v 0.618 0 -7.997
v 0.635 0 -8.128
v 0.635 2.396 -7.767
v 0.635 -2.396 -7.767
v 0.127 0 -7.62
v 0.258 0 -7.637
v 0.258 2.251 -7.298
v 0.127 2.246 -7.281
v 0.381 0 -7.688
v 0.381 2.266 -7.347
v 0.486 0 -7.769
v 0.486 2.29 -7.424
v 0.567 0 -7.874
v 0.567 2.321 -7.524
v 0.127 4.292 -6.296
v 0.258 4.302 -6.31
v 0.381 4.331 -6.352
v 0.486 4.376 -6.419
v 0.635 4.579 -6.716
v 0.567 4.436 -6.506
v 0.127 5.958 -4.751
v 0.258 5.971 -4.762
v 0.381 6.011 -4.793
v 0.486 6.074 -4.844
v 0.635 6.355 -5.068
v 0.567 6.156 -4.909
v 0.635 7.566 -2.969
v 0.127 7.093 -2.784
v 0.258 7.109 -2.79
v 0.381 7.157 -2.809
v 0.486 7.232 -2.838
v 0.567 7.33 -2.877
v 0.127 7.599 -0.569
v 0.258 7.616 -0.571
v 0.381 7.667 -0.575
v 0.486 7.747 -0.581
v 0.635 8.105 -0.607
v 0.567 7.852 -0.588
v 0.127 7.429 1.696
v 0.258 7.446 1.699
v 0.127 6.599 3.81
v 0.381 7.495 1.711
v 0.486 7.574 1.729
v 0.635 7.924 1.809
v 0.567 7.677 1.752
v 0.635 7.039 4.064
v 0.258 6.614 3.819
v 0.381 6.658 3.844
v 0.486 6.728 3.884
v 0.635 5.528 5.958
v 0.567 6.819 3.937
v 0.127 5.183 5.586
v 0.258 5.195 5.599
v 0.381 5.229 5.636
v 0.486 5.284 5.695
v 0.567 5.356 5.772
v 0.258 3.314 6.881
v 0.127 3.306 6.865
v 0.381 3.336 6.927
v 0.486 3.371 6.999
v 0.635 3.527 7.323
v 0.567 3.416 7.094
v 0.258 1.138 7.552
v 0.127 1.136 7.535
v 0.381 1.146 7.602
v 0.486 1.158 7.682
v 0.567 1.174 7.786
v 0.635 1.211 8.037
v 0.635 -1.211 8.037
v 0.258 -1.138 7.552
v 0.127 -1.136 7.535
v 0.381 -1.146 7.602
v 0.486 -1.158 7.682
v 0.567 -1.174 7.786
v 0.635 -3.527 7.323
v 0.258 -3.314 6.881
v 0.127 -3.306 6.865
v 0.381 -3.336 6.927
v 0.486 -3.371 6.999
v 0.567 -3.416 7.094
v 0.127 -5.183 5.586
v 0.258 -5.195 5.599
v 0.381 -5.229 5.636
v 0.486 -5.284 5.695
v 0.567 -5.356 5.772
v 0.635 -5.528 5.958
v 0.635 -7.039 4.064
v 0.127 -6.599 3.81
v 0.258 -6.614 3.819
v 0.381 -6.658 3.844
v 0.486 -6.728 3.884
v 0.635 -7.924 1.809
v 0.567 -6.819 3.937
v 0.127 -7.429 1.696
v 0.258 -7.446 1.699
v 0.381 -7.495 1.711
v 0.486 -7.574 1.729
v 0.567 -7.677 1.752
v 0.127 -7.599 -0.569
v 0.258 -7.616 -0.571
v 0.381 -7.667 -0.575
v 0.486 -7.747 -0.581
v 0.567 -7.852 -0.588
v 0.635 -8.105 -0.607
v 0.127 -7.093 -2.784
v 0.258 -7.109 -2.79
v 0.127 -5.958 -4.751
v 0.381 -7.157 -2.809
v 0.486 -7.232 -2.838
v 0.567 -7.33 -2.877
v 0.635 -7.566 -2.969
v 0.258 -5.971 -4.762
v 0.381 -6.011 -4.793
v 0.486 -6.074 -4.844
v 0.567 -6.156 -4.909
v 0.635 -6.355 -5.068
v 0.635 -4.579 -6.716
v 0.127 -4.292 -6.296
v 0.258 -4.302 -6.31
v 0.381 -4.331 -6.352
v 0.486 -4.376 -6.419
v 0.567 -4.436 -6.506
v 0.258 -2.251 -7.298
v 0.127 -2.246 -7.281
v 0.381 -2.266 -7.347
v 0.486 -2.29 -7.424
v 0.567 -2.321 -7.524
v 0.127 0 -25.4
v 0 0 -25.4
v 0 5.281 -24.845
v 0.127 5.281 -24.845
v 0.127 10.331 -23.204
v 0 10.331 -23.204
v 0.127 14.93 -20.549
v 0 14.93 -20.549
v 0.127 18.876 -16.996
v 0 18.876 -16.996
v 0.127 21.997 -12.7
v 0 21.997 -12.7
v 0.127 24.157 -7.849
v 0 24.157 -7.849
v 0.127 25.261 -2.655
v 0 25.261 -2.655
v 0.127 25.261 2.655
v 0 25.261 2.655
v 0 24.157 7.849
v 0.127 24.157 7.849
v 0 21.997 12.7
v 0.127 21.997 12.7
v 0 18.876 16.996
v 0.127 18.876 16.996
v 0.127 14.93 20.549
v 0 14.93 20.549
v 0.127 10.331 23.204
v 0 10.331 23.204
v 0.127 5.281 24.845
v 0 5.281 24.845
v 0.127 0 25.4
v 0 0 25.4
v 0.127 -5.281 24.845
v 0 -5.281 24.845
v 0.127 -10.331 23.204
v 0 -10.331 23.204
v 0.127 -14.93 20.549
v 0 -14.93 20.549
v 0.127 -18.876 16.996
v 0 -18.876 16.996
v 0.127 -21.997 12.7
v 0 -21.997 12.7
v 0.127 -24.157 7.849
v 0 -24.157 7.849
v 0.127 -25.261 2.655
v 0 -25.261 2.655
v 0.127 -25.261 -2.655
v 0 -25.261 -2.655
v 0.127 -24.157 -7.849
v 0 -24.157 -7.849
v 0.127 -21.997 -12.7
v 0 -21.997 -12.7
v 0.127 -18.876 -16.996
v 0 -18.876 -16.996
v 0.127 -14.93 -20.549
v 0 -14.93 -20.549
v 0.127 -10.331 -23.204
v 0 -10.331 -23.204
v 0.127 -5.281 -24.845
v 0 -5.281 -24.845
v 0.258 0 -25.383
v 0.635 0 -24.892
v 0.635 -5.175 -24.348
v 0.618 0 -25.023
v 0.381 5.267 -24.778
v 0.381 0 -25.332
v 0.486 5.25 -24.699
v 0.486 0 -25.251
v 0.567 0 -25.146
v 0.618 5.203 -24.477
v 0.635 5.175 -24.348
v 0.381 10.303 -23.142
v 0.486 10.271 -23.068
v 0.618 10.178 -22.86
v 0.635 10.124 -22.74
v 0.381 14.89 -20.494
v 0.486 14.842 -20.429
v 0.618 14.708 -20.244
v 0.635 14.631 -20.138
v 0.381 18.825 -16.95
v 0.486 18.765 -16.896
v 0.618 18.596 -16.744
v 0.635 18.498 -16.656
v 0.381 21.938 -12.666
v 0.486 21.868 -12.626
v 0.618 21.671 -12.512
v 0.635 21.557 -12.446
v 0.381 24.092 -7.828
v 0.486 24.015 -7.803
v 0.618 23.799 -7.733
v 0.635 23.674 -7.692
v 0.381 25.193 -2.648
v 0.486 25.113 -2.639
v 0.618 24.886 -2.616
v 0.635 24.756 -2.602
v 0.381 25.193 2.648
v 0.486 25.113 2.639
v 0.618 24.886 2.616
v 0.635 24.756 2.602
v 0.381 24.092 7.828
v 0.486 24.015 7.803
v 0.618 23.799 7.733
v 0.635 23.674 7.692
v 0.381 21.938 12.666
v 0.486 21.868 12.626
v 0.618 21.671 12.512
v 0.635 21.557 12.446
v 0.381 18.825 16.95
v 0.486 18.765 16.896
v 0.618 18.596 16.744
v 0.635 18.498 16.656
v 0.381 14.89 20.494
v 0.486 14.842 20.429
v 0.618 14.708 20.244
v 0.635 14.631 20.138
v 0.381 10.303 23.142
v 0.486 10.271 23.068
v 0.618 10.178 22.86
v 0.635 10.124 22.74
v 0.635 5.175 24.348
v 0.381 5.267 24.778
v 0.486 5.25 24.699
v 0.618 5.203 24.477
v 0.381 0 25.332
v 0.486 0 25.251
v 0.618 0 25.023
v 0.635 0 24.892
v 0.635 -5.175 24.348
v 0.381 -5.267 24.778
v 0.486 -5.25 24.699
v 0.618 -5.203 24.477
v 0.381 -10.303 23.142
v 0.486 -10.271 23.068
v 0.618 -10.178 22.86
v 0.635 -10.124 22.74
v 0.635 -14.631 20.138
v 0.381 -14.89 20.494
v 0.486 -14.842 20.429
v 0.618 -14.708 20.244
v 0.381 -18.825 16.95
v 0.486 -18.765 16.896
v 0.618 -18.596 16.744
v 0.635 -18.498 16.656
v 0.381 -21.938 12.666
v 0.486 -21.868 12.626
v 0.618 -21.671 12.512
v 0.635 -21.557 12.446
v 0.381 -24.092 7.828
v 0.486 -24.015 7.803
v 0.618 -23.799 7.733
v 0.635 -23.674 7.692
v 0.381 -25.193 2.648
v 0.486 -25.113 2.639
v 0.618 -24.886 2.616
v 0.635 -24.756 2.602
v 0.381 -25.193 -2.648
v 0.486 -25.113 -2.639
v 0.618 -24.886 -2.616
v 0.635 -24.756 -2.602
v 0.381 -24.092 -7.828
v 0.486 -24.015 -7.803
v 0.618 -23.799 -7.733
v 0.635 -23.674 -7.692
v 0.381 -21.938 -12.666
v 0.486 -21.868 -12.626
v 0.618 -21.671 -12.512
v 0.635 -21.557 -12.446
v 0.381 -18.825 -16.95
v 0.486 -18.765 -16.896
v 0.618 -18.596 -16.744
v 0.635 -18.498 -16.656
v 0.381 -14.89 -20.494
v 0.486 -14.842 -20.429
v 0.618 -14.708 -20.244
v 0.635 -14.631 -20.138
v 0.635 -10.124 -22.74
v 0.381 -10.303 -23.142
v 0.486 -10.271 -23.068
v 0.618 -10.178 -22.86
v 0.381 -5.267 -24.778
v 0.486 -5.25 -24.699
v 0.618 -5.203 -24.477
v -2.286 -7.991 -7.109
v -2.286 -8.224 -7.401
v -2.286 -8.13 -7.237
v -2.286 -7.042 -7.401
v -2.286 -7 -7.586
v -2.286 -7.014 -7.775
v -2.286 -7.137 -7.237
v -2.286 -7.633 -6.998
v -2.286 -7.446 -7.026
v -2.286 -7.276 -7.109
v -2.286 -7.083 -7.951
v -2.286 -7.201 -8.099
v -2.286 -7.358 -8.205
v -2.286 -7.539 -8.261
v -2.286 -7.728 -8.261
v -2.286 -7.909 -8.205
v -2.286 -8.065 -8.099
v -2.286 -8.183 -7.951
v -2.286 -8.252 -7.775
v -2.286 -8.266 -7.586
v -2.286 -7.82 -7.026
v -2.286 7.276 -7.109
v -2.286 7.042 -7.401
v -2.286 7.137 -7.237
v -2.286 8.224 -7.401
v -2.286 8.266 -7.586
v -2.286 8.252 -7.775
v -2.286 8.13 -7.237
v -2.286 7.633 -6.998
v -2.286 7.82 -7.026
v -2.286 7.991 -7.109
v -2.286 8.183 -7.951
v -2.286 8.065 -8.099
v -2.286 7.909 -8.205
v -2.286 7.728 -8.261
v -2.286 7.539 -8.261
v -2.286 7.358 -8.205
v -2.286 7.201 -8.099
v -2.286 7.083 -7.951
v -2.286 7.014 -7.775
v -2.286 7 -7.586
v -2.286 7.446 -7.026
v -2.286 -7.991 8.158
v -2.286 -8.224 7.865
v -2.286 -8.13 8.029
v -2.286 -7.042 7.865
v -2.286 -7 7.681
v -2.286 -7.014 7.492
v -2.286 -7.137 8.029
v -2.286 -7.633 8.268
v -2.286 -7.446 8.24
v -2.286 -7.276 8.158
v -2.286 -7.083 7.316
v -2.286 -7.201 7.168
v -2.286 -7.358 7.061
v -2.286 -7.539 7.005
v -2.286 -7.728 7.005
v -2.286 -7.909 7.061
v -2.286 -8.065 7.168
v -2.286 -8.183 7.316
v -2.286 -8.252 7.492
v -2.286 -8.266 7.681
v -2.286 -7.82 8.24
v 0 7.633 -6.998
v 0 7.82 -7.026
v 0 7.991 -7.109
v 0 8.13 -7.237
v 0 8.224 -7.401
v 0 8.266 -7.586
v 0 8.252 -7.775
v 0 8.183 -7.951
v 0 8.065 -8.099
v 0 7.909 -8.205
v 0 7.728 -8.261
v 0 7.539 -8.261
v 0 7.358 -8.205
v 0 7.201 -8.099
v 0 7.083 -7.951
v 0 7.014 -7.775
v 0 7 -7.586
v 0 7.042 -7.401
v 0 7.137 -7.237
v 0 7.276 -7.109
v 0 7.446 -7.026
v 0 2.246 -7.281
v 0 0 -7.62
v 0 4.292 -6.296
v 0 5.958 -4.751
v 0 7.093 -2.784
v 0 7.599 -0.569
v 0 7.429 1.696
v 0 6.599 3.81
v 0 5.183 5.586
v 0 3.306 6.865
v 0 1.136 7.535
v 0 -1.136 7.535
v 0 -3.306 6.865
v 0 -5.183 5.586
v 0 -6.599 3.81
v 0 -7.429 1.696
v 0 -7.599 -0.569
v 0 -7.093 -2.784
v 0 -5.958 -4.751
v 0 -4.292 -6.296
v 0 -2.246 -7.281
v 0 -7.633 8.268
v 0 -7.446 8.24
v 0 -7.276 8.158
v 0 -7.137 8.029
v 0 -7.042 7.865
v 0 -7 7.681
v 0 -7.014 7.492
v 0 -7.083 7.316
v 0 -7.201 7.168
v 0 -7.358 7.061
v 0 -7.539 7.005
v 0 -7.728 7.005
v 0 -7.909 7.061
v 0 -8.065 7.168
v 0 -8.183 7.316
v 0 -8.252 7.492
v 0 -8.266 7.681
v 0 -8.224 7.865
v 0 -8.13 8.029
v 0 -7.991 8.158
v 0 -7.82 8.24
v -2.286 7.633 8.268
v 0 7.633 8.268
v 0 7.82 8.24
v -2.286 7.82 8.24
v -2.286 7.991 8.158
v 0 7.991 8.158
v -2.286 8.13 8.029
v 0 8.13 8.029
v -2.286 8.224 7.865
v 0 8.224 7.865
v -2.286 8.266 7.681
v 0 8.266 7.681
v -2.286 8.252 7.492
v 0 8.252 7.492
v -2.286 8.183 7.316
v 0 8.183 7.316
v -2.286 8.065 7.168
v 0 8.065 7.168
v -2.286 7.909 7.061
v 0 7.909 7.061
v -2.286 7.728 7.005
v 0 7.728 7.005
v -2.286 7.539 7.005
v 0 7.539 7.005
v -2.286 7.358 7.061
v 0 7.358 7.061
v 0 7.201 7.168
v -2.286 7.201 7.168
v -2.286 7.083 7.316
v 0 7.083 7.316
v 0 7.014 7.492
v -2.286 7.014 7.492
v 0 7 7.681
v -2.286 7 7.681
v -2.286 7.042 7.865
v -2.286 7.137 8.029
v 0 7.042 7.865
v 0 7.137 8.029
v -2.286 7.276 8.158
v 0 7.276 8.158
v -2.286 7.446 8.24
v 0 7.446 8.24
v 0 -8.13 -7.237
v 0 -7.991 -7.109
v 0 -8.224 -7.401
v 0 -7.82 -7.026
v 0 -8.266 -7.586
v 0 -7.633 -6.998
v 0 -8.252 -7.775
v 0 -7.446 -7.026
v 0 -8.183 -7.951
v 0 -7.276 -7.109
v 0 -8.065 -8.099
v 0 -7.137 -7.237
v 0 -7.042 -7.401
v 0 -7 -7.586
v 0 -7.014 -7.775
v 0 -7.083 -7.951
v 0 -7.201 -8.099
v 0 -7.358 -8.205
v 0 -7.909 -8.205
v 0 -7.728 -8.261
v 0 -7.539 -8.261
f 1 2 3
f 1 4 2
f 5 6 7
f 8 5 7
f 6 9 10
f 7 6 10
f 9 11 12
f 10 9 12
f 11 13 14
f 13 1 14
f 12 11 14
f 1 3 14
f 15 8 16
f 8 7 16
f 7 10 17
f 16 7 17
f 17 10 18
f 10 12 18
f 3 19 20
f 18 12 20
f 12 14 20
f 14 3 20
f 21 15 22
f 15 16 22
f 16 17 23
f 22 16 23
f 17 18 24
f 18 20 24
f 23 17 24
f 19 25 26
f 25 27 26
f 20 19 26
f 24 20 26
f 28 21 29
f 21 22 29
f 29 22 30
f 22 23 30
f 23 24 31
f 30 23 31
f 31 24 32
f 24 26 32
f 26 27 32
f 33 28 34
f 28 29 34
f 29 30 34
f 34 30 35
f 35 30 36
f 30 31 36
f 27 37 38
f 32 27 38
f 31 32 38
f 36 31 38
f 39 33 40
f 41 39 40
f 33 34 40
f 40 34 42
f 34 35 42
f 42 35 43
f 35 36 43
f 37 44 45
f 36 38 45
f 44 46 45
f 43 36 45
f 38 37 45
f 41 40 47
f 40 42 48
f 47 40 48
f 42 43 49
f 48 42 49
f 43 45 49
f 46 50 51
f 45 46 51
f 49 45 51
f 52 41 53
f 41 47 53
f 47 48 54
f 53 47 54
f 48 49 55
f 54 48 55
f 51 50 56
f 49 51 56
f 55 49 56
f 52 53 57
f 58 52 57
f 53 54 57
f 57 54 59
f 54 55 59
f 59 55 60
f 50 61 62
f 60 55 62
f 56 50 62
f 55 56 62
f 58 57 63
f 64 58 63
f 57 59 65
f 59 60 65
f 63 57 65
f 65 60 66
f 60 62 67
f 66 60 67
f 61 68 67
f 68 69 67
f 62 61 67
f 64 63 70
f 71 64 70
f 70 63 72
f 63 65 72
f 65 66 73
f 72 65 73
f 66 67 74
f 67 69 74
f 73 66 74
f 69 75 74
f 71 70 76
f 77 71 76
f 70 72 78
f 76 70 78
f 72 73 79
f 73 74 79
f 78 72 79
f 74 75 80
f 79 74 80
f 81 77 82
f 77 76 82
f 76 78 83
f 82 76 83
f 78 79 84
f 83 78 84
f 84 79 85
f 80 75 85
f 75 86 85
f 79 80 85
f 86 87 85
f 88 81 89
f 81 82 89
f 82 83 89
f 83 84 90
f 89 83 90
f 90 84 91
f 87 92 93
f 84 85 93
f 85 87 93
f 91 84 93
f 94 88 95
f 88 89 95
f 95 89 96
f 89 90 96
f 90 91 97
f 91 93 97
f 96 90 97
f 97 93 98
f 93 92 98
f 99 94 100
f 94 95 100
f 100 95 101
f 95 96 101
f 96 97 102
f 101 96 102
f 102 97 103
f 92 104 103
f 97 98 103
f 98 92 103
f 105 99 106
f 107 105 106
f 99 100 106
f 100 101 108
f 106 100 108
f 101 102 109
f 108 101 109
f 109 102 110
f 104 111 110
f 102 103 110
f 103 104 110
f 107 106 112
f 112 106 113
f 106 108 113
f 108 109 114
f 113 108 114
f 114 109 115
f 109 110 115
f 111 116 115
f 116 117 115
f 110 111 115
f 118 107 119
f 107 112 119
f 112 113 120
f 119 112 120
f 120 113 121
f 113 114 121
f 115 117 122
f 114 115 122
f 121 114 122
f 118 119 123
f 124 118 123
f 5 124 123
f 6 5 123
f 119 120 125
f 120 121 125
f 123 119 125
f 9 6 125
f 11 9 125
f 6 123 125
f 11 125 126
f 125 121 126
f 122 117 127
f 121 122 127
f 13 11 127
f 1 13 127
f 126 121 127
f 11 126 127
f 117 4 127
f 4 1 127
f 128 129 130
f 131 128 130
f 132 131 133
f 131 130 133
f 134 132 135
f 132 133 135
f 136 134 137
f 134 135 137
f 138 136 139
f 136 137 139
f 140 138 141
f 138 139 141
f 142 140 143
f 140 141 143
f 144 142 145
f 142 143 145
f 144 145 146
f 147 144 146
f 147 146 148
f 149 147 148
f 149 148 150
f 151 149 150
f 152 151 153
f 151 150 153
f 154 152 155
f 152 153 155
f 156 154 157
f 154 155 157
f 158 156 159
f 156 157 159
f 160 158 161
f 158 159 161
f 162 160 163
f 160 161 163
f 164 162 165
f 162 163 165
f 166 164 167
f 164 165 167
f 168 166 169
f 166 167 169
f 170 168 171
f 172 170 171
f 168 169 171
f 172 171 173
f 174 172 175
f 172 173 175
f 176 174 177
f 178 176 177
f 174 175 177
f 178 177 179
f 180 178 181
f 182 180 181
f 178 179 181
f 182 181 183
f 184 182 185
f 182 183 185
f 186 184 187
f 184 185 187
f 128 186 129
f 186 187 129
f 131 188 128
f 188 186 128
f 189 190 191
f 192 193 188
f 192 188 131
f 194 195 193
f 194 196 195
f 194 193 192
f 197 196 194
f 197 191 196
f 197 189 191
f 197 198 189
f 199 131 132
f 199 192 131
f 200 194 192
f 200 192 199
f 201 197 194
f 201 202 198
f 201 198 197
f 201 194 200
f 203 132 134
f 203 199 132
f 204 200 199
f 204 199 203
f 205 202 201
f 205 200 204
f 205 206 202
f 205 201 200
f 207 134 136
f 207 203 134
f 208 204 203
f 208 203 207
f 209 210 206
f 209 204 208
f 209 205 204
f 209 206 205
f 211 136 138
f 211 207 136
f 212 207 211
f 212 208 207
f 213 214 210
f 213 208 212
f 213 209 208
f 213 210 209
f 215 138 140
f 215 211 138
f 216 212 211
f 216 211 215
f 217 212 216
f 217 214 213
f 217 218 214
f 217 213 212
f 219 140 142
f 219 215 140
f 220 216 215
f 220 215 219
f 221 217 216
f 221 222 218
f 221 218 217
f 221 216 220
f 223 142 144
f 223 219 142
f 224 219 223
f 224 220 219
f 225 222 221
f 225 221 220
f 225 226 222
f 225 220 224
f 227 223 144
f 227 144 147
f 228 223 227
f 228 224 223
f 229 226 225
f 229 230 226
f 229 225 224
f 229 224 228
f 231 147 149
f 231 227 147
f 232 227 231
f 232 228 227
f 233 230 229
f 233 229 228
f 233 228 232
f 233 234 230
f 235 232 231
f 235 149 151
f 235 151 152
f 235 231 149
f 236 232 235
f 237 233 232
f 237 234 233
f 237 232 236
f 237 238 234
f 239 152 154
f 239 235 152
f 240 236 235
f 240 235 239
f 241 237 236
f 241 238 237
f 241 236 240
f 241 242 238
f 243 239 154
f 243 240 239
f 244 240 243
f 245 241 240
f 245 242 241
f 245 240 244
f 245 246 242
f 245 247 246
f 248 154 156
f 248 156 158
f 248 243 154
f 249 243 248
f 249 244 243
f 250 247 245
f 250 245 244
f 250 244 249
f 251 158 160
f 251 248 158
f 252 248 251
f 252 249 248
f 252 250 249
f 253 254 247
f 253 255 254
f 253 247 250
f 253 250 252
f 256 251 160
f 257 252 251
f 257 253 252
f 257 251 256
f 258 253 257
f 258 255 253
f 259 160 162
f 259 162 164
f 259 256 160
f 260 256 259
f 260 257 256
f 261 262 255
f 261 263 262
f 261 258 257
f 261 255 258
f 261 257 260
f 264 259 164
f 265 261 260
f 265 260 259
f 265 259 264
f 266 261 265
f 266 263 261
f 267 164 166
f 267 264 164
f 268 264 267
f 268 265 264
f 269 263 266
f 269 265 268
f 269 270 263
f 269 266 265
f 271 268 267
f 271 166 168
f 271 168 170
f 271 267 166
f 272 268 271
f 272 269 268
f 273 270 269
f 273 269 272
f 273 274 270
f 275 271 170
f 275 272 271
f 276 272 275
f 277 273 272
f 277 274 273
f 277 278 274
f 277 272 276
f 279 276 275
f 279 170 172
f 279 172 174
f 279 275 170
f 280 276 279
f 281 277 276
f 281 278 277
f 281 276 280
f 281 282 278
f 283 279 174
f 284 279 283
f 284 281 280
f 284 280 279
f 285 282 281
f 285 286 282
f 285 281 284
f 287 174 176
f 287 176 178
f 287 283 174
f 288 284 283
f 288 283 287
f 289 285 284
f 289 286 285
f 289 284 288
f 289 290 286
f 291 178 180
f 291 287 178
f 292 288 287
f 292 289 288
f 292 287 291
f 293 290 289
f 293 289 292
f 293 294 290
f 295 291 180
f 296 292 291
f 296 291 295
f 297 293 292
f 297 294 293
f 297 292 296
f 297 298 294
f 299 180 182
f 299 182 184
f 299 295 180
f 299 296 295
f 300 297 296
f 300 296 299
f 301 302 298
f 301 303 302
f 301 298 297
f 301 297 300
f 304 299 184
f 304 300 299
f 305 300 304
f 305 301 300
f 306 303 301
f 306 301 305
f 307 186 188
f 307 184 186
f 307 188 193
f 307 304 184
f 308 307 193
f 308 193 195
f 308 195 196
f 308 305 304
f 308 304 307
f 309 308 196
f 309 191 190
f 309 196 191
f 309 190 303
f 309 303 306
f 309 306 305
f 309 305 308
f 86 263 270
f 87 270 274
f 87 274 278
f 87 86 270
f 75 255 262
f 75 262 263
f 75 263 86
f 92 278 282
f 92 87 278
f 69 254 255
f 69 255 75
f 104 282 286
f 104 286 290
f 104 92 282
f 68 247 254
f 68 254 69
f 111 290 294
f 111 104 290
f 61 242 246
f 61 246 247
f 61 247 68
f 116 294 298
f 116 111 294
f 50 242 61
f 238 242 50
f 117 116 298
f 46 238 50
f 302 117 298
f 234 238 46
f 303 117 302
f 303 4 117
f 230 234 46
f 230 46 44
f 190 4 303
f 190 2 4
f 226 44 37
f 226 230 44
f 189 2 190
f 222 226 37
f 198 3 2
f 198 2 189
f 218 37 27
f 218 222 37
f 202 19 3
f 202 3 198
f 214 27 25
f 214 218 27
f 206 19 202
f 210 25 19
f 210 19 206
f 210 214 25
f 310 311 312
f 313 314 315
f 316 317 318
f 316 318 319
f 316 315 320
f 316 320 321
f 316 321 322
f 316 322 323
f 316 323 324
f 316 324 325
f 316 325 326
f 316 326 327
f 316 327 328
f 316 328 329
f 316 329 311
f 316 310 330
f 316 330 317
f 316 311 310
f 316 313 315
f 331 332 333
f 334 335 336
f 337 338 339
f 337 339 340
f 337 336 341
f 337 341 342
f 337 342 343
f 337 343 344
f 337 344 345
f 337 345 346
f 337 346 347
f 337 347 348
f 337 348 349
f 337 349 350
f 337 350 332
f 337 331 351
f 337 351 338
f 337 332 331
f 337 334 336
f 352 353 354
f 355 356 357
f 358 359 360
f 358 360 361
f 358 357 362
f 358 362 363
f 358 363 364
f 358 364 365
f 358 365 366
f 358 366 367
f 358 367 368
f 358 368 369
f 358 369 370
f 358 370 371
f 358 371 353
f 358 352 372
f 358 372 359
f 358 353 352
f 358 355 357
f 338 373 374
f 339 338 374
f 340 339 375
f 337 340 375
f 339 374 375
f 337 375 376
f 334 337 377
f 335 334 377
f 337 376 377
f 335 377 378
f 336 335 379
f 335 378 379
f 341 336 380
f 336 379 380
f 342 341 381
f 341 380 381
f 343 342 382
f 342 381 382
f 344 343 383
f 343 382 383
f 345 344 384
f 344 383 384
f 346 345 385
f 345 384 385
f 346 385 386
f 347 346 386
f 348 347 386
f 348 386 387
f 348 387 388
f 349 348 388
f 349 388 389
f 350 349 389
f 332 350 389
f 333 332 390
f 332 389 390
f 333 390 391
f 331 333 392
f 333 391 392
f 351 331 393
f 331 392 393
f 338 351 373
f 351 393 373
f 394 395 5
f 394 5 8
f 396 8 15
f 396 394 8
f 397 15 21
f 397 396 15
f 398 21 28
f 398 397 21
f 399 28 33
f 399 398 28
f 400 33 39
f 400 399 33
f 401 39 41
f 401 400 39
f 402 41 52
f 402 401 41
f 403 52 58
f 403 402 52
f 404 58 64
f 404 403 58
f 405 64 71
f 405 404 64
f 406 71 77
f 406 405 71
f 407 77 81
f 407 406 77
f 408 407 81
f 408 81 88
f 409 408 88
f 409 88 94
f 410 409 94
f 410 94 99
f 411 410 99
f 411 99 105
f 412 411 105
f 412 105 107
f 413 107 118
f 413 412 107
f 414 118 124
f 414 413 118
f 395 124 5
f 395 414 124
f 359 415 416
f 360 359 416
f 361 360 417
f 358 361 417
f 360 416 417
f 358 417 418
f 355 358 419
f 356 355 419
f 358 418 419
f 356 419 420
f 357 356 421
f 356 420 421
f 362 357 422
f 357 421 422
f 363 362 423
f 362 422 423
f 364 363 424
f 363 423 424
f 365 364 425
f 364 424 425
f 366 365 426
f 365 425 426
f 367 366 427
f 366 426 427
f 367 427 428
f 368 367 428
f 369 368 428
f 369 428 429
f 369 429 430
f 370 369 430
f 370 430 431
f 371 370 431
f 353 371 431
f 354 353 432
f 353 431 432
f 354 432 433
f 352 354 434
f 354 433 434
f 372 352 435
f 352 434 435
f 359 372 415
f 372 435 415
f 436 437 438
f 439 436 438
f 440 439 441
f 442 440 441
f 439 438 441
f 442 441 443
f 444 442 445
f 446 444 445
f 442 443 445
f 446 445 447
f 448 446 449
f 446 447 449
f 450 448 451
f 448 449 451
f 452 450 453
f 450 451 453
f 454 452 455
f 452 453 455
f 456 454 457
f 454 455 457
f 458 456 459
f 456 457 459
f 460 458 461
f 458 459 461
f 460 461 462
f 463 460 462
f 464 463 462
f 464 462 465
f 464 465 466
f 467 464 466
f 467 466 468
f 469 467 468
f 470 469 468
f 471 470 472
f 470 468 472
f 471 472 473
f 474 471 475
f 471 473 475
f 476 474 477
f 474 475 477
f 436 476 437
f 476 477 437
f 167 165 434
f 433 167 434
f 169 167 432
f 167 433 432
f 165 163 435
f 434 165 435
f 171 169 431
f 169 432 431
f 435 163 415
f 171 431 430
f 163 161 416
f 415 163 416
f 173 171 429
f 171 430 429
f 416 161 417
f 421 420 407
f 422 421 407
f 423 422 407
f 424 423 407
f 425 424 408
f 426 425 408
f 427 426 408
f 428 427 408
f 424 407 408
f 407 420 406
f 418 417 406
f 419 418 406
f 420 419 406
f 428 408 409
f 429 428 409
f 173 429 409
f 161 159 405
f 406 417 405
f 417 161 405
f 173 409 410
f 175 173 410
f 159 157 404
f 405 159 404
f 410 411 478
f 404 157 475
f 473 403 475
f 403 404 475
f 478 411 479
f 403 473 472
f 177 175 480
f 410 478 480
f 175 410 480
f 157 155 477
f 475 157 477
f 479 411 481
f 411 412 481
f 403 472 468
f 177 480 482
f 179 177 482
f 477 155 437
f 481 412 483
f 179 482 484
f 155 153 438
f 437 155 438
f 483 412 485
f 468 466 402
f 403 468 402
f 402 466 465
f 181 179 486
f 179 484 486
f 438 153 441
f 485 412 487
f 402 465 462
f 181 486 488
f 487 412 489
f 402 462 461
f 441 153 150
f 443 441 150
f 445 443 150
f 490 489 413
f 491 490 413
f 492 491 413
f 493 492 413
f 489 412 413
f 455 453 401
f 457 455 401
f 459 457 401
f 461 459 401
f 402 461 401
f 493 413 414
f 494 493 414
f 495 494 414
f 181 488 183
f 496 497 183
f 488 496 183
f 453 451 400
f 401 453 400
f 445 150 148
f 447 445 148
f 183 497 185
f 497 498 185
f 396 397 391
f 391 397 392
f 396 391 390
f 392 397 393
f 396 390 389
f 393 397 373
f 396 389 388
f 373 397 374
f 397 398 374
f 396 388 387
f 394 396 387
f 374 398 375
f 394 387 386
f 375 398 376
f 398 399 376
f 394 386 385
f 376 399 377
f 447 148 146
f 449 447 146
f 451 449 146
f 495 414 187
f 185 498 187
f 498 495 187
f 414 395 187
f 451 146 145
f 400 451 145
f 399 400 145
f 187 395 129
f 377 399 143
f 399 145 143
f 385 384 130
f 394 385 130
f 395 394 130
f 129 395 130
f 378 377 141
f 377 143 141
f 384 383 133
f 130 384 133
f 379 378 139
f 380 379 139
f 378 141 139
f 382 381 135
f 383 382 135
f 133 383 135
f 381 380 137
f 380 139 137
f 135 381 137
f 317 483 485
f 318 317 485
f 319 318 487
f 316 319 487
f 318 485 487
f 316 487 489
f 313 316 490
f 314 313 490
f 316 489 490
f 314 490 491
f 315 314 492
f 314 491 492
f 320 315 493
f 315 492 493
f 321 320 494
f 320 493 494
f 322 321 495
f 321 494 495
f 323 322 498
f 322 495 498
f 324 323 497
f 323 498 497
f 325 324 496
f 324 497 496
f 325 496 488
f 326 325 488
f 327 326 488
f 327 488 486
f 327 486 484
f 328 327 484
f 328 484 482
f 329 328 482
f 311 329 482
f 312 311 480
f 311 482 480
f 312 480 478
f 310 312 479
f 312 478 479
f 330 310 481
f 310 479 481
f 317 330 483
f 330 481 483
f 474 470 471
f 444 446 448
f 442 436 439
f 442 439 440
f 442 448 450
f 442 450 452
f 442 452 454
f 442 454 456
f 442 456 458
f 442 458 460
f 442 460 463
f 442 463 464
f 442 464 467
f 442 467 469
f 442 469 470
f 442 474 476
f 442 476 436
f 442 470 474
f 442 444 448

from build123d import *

# Parameters (mm, degrees)
SKETCH1_R           = 25.4
SKETCH1_R_2         = 7.62
BOSS_EXTRUDE1_DEPTH = 0.635
FILLET1_R           = 0.508
SKETCH2_R           = 0.635
BOSS_EXTRUDE2_DEPTH = 2.286


with BuildPart() as part:
    # Sketch1 → Boss-Extrude1 (new body)
    with BuildSketch(Plane(origin=(0, 0, 0), x_dir=(0, 0, -1), z_dir=(1, 0, 0))):
        Circle(SKETCH1_R)
        Circle(SKETCH1_R_2, mode=Mode.SUBTRACT)
    extrude(amount=BOSS_EXTRUDE1_DEPTH)

    # Fillet1
    fillet1_edges = [part.edges().sort_by_distance(p)[0] for p in [
        (0.635, 0, 25.4),
        (0.635, 0, 7.62),
    ]]
    fillet(fillet1_edges, radius=FILLET1_R)

    # Sketch2 → Boss-Extrude2 (add)
    with BuildSketch(Plane.ZY):
        with Locations((-7.633217703, 7.633217703)):
            Circle(SKETCH2_R)
        with Locations((7.633217703, 7.633217703)):
            Circle(SKETCH2_R)
        with Locations((7.633217703, -7.633217703)):
            Circle(SKETCH2_R)
        with Locations((-7.633217703, -7.633217703)):
            Circle(SKETCH2_R)
    extrude(amount=BOSS_EXTRUDE2_DEPTH)


solid = part.part
